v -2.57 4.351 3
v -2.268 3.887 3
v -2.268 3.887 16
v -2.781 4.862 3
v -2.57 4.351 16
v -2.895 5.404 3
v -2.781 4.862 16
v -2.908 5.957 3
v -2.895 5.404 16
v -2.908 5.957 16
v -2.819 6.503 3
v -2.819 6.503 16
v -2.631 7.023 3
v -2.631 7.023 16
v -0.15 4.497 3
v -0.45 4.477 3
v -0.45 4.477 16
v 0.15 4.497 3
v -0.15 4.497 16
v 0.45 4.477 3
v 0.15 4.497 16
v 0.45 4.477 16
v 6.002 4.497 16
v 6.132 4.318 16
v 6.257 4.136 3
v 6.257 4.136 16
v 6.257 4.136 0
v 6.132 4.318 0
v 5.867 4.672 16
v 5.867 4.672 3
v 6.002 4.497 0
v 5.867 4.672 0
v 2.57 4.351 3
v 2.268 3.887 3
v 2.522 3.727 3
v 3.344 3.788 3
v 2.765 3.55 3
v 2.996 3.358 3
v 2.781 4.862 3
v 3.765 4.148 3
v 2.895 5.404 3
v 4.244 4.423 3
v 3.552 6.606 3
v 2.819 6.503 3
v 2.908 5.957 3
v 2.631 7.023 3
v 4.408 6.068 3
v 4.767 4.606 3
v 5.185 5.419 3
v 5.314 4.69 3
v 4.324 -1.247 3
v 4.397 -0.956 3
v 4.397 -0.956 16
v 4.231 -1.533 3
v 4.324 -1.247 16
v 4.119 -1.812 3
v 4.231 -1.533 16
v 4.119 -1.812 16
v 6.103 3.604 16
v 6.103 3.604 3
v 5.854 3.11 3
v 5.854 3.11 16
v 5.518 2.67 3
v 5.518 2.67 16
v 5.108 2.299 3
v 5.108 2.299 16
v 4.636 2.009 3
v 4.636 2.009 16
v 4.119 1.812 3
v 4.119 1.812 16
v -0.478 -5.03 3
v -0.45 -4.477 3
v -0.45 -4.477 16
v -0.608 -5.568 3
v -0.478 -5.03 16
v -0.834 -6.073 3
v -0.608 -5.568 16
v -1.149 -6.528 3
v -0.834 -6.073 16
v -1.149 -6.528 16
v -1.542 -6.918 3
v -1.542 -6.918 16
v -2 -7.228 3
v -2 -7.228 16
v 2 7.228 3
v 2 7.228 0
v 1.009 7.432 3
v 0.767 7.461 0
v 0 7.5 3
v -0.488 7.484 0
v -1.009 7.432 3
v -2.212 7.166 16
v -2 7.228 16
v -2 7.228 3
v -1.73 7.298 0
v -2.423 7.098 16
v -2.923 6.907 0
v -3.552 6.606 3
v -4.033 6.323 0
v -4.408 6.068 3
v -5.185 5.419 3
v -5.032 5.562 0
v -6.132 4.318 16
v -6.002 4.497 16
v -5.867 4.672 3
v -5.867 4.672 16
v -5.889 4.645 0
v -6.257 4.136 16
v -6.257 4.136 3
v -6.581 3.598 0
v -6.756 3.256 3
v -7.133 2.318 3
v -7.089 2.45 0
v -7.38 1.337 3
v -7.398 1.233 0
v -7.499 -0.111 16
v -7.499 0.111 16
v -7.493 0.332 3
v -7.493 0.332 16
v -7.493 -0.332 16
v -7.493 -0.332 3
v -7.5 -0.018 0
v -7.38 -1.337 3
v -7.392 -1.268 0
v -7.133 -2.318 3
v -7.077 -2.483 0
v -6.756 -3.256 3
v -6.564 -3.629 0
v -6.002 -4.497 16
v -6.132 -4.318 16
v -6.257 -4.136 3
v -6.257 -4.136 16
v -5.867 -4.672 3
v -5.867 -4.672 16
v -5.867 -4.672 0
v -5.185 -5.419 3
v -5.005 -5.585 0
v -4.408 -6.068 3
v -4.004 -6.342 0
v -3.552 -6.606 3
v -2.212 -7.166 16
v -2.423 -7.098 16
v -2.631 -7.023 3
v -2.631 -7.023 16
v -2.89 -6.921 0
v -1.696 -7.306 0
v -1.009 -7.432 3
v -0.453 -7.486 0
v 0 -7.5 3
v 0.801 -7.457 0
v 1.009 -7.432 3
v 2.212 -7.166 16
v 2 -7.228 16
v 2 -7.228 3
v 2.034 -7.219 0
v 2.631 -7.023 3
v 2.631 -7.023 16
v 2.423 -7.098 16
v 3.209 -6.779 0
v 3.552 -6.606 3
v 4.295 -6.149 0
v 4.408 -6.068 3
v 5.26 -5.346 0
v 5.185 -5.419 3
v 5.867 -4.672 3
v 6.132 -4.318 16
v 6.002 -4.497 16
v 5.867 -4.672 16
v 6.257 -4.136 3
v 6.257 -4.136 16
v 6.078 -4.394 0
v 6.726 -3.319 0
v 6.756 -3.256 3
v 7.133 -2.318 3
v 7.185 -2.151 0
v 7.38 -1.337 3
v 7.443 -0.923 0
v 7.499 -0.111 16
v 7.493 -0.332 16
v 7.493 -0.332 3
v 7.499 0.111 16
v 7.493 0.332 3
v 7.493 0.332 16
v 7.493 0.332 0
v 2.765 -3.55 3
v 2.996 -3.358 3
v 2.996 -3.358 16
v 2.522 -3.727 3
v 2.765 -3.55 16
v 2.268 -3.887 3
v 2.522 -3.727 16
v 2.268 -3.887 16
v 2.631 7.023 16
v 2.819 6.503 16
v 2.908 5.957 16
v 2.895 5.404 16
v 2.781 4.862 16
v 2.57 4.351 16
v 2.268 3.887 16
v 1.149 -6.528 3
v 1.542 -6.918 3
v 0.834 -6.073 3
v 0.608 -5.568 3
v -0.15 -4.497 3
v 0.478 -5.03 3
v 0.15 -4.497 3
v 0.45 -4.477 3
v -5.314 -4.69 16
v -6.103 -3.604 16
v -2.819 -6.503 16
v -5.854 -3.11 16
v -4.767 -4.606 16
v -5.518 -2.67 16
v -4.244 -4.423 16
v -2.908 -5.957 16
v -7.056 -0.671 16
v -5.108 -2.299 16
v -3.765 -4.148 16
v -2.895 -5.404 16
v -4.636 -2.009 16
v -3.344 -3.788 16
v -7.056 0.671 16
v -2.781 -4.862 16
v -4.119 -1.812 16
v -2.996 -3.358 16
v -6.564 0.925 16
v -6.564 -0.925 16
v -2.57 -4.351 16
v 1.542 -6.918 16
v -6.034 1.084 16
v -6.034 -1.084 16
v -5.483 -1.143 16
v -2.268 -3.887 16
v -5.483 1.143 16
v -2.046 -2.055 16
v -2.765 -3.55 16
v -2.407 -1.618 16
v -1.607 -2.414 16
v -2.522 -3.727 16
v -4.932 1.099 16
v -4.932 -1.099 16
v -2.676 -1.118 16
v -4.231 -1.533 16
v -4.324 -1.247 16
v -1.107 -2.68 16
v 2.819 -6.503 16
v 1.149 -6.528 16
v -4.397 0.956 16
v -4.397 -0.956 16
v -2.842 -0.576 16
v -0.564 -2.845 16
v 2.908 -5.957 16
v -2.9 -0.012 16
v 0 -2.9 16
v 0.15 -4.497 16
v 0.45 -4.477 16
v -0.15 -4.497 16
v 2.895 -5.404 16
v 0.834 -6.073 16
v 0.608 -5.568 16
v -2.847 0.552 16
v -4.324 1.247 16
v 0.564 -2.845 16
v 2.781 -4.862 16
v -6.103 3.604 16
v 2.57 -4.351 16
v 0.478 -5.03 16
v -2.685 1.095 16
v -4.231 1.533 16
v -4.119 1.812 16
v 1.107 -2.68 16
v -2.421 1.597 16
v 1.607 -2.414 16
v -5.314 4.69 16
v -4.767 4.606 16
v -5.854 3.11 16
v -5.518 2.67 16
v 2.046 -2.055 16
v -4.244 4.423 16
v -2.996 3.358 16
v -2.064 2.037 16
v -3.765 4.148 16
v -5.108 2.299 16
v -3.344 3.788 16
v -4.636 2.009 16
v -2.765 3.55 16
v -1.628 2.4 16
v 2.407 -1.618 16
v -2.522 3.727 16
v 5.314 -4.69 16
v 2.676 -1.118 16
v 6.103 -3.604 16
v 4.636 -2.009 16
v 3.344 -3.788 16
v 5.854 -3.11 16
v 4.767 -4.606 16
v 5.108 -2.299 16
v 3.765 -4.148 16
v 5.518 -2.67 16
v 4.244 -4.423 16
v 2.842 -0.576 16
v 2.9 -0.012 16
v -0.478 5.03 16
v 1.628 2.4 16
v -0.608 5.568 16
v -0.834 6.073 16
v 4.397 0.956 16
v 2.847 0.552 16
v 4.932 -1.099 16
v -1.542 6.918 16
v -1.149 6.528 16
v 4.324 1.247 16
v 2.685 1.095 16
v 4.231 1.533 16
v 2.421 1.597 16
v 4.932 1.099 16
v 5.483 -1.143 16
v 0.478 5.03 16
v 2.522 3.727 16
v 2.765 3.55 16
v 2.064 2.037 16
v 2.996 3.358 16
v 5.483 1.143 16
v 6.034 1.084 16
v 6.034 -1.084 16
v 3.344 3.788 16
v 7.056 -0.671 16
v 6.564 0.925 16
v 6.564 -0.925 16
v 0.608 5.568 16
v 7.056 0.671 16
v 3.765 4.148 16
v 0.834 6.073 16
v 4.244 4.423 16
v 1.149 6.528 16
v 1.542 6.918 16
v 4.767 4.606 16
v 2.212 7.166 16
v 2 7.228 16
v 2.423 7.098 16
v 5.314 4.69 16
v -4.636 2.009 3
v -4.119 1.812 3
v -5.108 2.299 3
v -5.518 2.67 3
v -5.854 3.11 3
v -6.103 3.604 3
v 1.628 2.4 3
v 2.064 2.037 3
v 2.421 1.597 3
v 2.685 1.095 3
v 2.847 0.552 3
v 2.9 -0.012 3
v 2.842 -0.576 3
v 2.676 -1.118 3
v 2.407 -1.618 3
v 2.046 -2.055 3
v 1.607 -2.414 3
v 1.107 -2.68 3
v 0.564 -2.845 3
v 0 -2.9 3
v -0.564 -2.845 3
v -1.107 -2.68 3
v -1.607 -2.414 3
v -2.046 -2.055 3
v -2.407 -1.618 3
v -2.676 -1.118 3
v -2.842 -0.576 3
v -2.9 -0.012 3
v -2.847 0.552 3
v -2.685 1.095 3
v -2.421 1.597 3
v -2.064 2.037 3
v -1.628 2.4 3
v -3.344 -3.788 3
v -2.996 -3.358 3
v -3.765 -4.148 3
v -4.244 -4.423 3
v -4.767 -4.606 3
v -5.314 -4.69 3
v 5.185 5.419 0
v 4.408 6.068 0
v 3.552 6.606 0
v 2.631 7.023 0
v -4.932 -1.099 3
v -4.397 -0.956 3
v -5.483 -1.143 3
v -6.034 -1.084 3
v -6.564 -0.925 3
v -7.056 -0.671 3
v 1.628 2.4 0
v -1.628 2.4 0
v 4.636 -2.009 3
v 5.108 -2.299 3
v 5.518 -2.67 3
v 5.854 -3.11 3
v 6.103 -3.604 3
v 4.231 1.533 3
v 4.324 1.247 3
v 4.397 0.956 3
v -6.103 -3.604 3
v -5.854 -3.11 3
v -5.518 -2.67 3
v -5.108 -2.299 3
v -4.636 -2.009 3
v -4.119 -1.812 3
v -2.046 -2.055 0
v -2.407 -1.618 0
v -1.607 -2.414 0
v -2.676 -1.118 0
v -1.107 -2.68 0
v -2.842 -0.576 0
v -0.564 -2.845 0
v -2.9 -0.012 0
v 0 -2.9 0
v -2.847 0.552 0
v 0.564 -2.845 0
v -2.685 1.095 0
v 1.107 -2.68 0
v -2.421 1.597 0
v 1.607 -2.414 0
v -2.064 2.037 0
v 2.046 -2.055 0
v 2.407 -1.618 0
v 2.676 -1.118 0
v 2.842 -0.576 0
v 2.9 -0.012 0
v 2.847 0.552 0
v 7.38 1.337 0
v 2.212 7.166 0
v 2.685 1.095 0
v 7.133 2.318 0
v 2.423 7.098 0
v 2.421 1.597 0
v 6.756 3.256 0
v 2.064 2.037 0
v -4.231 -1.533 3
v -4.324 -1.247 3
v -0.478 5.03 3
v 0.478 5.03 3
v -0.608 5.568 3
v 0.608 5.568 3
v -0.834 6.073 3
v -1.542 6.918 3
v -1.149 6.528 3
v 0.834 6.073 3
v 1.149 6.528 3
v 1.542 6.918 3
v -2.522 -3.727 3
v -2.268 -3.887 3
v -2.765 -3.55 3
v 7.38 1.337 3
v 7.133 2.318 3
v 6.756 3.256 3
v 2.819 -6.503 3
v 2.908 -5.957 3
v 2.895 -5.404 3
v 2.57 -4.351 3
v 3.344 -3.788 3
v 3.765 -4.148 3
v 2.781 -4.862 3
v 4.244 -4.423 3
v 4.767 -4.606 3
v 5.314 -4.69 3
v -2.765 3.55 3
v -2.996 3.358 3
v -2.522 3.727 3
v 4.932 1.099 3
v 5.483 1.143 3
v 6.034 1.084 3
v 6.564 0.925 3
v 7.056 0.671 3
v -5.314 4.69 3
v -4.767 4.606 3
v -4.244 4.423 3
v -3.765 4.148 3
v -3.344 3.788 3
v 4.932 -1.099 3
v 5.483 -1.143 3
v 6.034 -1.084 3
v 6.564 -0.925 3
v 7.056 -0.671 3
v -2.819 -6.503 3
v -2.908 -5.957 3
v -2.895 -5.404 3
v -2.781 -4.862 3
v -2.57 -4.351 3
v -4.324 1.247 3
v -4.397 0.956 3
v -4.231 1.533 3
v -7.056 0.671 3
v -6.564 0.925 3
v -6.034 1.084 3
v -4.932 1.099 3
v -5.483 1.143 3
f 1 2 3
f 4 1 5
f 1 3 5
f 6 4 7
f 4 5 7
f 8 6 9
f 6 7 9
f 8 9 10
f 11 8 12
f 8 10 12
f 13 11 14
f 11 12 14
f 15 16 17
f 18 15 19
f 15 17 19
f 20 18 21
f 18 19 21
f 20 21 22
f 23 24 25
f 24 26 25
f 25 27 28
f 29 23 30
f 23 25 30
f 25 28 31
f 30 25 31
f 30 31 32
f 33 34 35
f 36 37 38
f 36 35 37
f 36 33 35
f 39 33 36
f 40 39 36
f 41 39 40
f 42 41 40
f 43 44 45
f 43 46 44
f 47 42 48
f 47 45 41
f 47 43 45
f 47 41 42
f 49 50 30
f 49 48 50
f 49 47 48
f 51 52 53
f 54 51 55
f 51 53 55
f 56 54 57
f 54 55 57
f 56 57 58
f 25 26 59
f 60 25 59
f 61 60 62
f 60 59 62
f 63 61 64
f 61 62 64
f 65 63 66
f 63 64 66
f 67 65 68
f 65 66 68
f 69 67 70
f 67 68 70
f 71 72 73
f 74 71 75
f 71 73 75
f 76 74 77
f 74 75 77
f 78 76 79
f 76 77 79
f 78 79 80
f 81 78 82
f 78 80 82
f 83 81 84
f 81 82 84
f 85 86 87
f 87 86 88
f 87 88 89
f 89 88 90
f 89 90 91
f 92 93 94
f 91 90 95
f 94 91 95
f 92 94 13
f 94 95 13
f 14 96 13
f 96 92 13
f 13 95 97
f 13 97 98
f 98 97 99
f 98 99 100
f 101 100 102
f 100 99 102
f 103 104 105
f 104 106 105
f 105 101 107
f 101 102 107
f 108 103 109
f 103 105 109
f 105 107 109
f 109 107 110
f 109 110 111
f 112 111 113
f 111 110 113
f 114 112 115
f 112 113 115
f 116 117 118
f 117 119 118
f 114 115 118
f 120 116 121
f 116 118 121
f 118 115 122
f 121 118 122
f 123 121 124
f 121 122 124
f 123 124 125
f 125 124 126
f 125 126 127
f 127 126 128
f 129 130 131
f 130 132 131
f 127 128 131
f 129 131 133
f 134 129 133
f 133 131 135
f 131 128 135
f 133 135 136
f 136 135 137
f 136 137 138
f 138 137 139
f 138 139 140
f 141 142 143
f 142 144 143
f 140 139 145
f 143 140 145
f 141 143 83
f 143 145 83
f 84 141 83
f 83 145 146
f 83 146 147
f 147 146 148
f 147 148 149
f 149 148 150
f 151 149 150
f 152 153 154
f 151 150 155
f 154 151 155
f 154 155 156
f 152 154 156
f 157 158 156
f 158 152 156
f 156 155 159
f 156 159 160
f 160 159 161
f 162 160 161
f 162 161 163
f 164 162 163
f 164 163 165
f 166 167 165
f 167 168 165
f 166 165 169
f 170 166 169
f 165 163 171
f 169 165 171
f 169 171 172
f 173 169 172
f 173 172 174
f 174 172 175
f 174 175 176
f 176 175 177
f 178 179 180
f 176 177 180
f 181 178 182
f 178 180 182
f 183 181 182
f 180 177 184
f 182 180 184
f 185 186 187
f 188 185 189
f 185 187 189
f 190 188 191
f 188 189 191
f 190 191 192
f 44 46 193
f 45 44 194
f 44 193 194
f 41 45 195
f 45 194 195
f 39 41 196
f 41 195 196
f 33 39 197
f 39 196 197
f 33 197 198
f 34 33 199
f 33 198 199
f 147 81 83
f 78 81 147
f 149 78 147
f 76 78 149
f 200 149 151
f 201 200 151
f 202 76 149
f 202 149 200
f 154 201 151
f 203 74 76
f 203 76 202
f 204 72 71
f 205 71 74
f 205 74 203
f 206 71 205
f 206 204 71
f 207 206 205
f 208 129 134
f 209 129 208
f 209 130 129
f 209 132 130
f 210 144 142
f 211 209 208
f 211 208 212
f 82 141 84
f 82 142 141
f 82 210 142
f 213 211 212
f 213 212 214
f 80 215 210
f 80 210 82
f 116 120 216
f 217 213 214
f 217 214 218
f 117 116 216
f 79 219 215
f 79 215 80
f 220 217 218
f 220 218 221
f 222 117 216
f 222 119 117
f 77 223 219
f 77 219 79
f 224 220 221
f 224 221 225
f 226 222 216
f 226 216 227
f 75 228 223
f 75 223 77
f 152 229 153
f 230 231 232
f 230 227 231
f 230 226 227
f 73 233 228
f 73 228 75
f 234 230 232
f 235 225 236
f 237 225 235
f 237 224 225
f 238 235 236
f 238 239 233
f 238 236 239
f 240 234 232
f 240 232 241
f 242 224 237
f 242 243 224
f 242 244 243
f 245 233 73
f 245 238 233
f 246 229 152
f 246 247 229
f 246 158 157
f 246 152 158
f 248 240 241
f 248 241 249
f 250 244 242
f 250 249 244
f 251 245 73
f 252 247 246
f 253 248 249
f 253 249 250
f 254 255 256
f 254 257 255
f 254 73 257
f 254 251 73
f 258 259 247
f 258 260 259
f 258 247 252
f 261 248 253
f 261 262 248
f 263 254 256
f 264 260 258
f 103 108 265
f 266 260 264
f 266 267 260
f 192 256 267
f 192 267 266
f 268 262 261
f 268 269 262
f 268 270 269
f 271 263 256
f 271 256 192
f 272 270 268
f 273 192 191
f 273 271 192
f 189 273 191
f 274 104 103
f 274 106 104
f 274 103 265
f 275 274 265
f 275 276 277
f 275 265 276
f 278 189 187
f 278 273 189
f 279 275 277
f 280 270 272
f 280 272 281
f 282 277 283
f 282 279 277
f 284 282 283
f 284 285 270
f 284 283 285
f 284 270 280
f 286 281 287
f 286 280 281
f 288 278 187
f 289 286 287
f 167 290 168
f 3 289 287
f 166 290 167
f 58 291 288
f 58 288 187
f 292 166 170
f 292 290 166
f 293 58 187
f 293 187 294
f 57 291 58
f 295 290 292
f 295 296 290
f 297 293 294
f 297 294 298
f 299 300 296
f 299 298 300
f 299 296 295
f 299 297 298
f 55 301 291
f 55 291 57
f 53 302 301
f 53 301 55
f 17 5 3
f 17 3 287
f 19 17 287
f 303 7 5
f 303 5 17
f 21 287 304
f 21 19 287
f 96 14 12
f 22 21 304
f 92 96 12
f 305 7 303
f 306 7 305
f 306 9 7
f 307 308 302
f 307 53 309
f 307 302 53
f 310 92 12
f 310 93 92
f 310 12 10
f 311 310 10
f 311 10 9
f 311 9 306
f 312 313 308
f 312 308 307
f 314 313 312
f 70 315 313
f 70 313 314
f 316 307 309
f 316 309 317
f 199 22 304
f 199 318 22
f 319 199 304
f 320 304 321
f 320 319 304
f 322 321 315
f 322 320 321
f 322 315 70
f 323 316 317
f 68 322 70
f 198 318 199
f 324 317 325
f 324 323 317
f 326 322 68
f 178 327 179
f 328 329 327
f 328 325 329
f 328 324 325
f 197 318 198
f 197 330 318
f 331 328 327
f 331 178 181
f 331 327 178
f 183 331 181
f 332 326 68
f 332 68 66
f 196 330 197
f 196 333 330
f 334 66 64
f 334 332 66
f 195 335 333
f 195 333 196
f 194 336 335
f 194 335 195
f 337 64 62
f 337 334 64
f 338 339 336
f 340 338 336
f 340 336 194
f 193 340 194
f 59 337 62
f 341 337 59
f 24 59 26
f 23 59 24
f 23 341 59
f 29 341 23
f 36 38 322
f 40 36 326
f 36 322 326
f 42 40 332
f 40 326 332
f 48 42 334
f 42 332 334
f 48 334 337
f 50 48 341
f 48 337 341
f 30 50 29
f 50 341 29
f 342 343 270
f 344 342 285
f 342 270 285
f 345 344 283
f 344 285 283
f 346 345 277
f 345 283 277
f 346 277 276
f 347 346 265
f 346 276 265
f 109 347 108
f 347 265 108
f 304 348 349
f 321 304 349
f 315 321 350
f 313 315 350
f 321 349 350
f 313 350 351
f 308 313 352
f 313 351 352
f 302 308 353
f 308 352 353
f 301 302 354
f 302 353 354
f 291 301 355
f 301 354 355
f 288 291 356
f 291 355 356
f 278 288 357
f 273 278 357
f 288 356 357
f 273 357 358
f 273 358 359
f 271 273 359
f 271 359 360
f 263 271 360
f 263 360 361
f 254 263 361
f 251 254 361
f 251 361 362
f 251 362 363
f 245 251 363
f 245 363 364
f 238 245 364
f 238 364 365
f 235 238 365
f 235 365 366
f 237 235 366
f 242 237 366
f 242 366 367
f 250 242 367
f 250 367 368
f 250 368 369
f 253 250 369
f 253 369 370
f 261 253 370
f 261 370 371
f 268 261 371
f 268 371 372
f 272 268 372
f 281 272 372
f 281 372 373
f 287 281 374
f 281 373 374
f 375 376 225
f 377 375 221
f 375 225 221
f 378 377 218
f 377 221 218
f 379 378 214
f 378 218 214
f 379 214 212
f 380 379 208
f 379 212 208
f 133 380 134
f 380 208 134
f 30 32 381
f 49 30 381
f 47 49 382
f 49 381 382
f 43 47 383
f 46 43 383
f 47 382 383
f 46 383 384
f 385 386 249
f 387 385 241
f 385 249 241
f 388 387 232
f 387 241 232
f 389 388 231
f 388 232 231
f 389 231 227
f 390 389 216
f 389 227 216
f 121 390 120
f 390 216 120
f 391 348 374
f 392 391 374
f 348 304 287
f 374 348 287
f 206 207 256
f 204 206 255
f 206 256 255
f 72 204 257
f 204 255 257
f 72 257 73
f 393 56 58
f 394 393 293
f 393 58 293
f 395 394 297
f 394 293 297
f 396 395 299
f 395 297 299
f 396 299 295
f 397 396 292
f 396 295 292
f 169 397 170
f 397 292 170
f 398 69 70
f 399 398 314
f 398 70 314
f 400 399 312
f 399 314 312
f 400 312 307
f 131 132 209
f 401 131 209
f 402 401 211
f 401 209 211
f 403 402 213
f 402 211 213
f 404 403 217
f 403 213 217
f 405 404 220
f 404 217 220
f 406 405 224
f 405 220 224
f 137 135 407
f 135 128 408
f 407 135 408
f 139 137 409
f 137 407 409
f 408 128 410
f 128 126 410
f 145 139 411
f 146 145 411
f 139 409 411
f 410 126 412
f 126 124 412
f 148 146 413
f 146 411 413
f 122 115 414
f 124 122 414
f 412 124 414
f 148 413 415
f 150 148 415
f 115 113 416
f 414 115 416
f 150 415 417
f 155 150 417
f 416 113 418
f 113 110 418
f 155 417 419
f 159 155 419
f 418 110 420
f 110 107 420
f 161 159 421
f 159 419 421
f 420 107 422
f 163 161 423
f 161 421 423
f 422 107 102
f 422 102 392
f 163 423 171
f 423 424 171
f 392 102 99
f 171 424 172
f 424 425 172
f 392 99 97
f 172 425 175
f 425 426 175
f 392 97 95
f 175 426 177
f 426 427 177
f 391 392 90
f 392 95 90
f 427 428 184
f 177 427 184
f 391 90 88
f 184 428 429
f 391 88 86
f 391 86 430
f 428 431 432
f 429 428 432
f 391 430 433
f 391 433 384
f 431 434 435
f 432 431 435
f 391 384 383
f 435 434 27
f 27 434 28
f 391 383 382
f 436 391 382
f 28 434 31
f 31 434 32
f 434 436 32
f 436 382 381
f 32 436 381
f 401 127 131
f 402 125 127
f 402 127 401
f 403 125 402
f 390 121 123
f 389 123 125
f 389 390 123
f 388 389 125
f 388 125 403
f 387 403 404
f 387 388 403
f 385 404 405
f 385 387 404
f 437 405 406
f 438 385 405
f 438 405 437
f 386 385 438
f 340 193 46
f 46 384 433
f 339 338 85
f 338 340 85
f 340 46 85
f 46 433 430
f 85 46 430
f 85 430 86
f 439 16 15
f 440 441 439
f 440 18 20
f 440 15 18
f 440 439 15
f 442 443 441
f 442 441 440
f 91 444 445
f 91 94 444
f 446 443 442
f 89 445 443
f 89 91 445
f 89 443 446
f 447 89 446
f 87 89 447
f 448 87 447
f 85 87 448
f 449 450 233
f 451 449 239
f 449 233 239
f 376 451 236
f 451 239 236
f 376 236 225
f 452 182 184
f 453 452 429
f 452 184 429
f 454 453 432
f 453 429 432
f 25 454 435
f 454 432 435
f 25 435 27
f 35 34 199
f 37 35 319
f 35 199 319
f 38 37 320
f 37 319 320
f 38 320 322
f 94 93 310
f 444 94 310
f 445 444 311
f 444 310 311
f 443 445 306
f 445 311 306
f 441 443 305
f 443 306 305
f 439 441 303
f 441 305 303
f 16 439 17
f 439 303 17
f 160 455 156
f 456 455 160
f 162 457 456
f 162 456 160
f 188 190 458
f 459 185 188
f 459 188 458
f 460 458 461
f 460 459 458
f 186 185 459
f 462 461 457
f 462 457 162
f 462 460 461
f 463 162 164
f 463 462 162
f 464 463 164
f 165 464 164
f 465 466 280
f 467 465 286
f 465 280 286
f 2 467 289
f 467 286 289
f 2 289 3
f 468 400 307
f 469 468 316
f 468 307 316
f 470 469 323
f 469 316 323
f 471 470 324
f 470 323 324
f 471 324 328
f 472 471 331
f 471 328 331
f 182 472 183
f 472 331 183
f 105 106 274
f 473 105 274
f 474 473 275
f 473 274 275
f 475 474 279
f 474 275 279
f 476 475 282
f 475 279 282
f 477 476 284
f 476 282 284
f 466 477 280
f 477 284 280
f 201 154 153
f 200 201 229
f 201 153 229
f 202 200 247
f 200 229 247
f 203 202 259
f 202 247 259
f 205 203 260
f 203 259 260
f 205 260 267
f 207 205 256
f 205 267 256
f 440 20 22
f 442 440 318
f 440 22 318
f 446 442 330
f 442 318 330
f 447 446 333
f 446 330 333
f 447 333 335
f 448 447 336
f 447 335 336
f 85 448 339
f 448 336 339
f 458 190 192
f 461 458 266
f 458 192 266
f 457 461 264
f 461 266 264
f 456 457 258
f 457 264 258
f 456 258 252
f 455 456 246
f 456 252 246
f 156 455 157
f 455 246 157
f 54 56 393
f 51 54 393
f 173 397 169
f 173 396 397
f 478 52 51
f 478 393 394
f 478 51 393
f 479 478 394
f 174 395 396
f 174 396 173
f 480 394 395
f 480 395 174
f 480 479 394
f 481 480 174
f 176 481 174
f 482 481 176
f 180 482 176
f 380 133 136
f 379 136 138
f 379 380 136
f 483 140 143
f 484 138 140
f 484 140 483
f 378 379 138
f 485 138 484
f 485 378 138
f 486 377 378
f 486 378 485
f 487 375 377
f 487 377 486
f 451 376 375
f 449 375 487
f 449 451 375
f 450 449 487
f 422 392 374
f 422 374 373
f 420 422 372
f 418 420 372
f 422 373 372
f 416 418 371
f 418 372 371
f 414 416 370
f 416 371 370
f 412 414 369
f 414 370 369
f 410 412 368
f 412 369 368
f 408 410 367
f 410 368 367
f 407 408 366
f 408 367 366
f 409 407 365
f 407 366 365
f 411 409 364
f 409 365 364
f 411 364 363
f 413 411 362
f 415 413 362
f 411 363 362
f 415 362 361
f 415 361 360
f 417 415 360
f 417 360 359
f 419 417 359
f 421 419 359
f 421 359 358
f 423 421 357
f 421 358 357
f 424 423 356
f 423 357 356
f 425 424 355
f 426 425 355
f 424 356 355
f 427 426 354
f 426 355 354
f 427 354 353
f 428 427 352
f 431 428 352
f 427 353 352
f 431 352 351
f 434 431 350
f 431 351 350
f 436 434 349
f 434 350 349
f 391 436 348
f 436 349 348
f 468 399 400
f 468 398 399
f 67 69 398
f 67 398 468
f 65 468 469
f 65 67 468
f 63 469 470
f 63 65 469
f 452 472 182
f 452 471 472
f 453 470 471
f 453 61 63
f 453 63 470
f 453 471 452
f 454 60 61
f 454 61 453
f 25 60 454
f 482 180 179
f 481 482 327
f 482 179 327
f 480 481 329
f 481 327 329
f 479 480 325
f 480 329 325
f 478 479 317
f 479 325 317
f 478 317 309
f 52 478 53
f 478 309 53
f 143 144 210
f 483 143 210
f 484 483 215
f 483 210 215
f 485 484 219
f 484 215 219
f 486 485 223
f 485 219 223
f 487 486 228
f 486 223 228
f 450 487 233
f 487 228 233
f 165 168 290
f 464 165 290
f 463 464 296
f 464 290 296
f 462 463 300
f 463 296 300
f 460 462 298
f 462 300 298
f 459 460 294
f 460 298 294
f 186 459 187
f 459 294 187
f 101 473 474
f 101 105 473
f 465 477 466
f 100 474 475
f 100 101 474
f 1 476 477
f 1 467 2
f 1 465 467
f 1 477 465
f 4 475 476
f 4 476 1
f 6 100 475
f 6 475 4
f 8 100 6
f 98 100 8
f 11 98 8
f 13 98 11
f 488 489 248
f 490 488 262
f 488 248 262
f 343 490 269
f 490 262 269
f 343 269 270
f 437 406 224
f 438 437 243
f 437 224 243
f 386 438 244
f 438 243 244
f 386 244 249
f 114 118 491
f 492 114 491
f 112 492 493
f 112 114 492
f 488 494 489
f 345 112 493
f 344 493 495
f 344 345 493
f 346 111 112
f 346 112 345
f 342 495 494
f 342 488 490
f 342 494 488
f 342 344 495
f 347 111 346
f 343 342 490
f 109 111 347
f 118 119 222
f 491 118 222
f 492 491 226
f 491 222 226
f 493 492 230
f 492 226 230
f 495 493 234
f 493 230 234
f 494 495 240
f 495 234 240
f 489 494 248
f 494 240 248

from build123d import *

# Parameters (mm, degrees)
F0_R     = 7.5
F1_DEPTH = 16
F3_DEPTH = 16
F4_COUNT = 10
F5_R     = 7.5
F6_DEPTH = 3
F8_DEPTH = 3


with BuildPart() as f1:
    # F0 (on Top) → F1 (new body)
    with BuildSketch(Plane.XY):
        Circle(F0_R)
        with BuildLine():
            ThreePointArc((1.6278820596, 2.4), (0, -2.9), (-1.6278820596, 2.4))
            Line((-1.6278820596, 2.4), (1.6278820596, 2.4))
        make_face(mode=Mode.SUBTRACT)
    extrude(amount=F1_DEPTH)

    # F2 (on face) → F3 (cut, through all)
    with BuildSketch(Plane.XY.offset(16)):
        with BuildLine():
            ThreePointArc((0.45, 4.477443467), (0.833787098, 6.0733536603), (2, 7.2284161474))
            ThreePointArc((2, 7.2284161474), (0, 7.5), (-2, 7.2284161474))
            ThreePointArc((-2, 7.2284161474), (-0.833787098, 6.0733536603), (-0.45, 4.477443467))
            ThreePointArc((-0.45, 4.477443467), (0, 4.5), (0.45, 4.477443467))
        make_face()
    f3 = extrude(amount=-F3_DEPTH, mode=Mode.SUBTRACT)

    # F4: F3 ×10 about axis
    f4_axis = Axis((0, 0, 0), (0, 0, -1))
    for i in range(1, F4_COUNT):
        add(f3.rotate(f4_axis, i * 360 / F4_COUNT), mode=Mode.SUBTRACT)

    # F5 (on Top) → F6 (join)
    with BuildSketch(Plane.XY):
        Circle(F5_R)
    extrude(amount=F6_DEPTH)

    # F7 (on face) → F8 (cut, through all)
    with BuildSketch(Plane.XY.offset(3)):
        with BuildLine():
            Line((1.6278820596, 2.4), (-1.6278820596, 2.4))
            ThreePointArc((-1.6278820596, 2.4), (0, -2.9), (1.6278820596, 2.4))
        make_face()
    extrude(amount=-F8_DEPTH, mode=Mode.SUBTRACT)


solid = f1.part
